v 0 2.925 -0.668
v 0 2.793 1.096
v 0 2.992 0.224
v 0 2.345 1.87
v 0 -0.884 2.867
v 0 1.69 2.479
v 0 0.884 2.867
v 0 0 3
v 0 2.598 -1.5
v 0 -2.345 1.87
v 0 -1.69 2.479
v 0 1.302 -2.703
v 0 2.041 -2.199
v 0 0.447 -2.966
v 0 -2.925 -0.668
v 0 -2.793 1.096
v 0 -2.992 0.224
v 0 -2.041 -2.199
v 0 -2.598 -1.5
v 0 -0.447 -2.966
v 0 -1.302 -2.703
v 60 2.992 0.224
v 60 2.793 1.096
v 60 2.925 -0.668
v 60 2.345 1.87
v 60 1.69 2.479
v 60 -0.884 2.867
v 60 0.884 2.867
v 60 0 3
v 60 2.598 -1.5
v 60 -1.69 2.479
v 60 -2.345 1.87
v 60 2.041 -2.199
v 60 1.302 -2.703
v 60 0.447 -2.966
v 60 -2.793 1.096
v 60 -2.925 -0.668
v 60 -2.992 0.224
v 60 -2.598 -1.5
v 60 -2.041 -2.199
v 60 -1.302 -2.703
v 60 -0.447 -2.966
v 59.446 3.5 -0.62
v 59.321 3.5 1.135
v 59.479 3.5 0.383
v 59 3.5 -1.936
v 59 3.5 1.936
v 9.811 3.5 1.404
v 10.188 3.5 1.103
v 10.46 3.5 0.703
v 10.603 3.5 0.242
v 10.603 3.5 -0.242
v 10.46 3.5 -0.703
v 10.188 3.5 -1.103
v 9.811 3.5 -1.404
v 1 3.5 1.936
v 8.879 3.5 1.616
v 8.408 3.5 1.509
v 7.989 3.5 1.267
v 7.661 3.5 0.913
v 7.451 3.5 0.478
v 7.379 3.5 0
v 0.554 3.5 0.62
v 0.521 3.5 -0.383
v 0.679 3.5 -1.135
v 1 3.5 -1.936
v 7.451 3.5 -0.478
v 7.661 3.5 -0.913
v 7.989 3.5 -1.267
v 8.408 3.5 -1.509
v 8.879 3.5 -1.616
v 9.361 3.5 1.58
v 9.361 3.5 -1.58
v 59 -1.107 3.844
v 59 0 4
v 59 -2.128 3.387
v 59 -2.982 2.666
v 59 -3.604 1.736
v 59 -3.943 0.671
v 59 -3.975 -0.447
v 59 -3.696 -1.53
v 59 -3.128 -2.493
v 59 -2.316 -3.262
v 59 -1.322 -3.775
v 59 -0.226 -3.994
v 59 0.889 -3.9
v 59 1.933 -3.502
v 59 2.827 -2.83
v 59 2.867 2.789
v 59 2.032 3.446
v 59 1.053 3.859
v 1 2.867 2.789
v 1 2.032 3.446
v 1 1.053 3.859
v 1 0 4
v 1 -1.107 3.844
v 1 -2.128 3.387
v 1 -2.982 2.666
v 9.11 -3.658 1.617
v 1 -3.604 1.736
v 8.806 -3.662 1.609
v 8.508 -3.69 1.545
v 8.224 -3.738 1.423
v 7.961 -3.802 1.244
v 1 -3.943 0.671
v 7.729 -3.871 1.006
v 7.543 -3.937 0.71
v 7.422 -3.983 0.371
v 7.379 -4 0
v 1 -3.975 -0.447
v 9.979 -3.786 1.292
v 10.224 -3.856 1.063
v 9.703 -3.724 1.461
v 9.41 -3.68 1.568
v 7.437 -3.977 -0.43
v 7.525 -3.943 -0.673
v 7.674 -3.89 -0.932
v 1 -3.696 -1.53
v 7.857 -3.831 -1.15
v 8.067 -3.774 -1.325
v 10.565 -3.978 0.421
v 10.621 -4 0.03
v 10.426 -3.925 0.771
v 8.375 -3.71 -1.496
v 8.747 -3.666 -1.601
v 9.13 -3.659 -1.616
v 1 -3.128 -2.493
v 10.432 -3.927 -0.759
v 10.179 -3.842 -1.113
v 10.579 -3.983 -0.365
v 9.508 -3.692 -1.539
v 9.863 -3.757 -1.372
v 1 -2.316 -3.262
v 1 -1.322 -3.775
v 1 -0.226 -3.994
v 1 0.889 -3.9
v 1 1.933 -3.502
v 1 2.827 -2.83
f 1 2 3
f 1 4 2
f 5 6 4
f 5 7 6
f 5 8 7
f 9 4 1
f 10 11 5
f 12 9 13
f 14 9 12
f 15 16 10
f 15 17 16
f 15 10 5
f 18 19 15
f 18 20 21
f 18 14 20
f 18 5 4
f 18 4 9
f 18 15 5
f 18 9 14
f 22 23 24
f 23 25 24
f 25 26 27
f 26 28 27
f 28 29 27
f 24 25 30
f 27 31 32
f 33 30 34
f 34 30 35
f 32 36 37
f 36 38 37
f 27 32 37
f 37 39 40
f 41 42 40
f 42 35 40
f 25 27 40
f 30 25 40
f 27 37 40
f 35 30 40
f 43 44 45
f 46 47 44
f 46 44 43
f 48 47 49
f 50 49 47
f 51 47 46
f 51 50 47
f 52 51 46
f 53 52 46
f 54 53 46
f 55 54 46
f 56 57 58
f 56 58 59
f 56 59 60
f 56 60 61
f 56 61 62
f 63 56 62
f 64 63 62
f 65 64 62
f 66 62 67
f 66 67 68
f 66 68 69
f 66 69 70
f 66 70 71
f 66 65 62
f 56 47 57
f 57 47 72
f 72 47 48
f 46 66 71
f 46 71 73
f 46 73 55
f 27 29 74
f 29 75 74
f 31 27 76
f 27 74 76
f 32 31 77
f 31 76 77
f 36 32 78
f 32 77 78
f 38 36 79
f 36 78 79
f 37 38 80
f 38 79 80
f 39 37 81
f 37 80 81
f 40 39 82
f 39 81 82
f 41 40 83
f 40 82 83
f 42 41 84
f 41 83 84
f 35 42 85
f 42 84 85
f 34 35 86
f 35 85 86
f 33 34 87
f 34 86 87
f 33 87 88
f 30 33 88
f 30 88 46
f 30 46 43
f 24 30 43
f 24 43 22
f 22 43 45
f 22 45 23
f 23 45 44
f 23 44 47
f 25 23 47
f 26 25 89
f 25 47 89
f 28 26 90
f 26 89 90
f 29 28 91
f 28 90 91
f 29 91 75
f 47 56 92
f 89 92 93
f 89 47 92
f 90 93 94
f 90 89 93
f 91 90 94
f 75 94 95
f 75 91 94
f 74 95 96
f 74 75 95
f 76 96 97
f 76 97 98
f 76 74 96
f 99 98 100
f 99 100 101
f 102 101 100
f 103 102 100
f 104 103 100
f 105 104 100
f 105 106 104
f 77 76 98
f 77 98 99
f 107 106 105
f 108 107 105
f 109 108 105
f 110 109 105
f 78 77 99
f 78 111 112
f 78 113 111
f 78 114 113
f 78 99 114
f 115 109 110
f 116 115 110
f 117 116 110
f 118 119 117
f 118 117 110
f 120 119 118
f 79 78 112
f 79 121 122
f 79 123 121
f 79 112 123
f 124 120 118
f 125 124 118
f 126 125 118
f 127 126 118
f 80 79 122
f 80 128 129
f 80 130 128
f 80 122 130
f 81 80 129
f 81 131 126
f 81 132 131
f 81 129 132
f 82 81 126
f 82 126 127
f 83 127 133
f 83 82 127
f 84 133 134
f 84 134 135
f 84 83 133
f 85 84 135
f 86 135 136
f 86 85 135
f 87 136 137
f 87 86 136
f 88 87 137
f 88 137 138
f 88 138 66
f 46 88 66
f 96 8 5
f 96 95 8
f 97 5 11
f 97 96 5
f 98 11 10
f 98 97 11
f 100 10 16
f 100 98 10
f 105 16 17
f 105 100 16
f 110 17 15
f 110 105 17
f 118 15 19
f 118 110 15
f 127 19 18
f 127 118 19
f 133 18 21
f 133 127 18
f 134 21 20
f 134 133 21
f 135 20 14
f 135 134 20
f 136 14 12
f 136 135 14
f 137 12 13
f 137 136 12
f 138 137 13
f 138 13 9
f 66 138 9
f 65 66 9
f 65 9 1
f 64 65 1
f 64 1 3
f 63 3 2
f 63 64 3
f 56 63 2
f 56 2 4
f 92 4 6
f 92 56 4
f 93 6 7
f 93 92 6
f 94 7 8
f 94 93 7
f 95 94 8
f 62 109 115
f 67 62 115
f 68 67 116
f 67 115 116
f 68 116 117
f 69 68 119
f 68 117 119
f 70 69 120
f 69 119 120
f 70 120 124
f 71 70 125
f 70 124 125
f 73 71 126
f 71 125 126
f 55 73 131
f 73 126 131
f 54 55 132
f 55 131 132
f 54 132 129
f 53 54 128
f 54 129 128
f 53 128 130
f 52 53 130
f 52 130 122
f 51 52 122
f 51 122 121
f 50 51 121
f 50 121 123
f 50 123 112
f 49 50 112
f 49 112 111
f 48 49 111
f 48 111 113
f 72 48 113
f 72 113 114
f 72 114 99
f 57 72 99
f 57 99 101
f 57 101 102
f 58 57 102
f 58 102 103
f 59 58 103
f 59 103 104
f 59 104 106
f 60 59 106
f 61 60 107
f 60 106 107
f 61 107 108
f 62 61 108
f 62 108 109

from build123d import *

# Parameters (mm, degrees)
SKETCH1_W          = 60
SKETCH1_H          = 4
CHAMFER1_SIZE      = 1
CUT_EXTRUDE1_DEPTH = 61.266076693
TAP1_D             = 3.242


with BuildPart() as part:
    # Sketch1 → Revolve1 (revolve)
    with BuildSketch(Plane.XY, mode=Mode.PRIVATE) as revolve1_sk:
        with Locations((30, 2)):
            Rectangle(SKETCH1_W, SKETCH1_H)
    revolve(revolve1_sk.sketch.rotate(Axis((0, 0, 0), (1, 0, 0)), 90), axis=Axis((0, 0, 0), (1, 0, 0)))

    # Chamfer1
    chamfer1_edges = [part.edges().sort_by_distance(p)[0] for p in [
        (60, 0, -4),
        (0, 0, -4),
    ]]
    chamfer(chamfer1_edges, length=CHAMFER1_SIZE)

    # Sketch2 → Cut-Extrude1 (cut, through all)
    with BuildSketch(Plane(origin=(0, 0, 0), x_dir=(0, 0, -1), z_dir=(1, 0, 0))):
        with BuildLine():
            Line((-1.936491673, 3.5), (1.936491673, 3.5))
            ThreePointArc((1.936491673, 3.5), (0, 4), (-1.936491673, 3.5))
        make_face()
    extrude(amount=CUT_EXTRUDE1_DEPTH, mode=Mode.SUBTRACT)

    # Tap1 (through all)
    with Locations(Plane(origin=(0, 3.5, 0), x_dir=(1, 0, 0), z_dir=(0, 1, 0))):
        with Locations((9, 0)):
            Hole(TAP1_D / 2)


solid = part.part
